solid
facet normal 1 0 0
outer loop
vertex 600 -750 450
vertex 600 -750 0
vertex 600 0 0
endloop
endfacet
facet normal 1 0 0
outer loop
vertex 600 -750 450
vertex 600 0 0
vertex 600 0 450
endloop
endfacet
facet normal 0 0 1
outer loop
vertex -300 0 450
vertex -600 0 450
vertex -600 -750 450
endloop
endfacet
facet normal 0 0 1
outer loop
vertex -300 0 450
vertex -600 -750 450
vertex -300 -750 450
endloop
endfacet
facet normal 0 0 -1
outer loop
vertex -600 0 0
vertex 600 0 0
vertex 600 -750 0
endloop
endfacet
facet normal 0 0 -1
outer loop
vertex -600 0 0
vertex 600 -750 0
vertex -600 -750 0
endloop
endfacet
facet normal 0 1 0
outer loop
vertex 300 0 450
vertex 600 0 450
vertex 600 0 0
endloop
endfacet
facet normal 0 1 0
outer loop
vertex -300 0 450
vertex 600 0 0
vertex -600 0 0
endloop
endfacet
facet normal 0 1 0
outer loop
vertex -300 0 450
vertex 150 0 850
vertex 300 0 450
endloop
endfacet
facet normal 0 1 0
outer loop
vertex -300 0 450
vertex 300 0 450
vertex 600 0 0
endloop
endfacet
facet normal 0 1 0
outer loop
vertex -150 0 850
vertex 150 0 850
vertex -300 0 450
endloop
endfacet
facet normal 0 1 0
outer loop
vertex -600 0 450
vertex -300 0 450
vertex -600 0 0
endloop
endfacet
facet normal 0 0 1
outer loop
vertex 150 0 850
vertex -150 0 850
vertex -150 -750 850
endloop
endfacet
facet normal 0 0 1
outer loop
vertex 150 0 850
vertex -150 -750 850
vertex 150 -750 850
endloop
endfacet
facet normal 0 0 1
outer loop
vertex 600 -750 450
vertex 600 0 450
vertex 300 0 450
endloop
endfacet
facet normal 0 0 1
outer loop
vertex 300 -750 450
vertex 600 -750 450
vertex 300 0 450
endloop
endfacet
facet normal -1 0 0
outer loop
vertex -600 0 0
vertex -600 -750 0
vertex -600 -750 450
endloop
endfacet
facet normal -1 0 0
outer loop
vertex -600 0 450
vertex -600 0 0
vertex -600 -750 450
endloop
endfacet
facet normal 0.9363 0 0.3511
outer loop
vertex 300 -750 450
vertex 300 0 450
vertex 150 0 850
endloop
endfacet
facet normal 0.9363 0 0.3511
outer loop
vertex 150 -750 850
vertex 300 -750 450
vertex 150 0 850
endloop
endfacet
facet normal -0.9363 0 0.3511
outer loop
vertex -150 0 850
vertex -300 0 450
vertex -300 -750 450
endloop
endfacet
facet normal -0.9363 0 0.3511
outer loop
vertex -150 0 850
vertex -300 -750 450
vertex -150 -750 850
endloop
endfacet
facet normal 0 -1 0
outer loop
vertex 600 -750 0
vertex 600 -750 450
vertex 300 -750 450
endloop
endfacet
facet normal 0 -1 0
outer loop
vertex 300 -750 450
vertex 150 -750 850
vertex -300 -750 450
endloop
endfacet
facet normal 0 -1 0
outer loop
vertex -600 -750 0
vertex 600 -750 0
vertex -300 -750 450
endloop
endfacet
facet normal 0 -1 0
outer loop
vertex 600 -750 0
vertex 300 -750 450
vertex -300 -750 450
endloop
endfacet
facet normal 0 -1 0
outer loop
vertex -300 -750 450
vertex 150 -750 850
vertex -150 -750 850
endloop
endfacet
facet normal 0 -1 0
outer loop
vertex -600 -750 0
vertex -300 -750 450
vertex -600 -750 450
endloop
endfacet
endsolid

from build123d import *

# Parameters (mm, degrees)
F1_DEPTH = 750


# Not quite as in the source:
# - a pattern or mirror of a feature is missing from the dataset's text; its kind, count and spacing are read off the source's solid


with BuildPart() as f1:
    # F0 (on Front) → F1 (new body)
    with BuildSketch(Plane.XZ):
        Polygon((0, 450), (0, 0), (600, 0), (600, 450), (300, 450), align=None)
        Polygon((0, 850), (0, 450), (300, 450), (150, 850), align=None)
    extrude(amount=F1_DEPTH)

    # F1_copies: F1 across plane


with BuildPart() as f1_1:
    add(f1.part)
    add(f1.part.mirror(Plane(origin=(0, 0, 0), x_dir=(0, 0, -1), z_dir=(-1, 0, 0))))


solid = f1_1.part
